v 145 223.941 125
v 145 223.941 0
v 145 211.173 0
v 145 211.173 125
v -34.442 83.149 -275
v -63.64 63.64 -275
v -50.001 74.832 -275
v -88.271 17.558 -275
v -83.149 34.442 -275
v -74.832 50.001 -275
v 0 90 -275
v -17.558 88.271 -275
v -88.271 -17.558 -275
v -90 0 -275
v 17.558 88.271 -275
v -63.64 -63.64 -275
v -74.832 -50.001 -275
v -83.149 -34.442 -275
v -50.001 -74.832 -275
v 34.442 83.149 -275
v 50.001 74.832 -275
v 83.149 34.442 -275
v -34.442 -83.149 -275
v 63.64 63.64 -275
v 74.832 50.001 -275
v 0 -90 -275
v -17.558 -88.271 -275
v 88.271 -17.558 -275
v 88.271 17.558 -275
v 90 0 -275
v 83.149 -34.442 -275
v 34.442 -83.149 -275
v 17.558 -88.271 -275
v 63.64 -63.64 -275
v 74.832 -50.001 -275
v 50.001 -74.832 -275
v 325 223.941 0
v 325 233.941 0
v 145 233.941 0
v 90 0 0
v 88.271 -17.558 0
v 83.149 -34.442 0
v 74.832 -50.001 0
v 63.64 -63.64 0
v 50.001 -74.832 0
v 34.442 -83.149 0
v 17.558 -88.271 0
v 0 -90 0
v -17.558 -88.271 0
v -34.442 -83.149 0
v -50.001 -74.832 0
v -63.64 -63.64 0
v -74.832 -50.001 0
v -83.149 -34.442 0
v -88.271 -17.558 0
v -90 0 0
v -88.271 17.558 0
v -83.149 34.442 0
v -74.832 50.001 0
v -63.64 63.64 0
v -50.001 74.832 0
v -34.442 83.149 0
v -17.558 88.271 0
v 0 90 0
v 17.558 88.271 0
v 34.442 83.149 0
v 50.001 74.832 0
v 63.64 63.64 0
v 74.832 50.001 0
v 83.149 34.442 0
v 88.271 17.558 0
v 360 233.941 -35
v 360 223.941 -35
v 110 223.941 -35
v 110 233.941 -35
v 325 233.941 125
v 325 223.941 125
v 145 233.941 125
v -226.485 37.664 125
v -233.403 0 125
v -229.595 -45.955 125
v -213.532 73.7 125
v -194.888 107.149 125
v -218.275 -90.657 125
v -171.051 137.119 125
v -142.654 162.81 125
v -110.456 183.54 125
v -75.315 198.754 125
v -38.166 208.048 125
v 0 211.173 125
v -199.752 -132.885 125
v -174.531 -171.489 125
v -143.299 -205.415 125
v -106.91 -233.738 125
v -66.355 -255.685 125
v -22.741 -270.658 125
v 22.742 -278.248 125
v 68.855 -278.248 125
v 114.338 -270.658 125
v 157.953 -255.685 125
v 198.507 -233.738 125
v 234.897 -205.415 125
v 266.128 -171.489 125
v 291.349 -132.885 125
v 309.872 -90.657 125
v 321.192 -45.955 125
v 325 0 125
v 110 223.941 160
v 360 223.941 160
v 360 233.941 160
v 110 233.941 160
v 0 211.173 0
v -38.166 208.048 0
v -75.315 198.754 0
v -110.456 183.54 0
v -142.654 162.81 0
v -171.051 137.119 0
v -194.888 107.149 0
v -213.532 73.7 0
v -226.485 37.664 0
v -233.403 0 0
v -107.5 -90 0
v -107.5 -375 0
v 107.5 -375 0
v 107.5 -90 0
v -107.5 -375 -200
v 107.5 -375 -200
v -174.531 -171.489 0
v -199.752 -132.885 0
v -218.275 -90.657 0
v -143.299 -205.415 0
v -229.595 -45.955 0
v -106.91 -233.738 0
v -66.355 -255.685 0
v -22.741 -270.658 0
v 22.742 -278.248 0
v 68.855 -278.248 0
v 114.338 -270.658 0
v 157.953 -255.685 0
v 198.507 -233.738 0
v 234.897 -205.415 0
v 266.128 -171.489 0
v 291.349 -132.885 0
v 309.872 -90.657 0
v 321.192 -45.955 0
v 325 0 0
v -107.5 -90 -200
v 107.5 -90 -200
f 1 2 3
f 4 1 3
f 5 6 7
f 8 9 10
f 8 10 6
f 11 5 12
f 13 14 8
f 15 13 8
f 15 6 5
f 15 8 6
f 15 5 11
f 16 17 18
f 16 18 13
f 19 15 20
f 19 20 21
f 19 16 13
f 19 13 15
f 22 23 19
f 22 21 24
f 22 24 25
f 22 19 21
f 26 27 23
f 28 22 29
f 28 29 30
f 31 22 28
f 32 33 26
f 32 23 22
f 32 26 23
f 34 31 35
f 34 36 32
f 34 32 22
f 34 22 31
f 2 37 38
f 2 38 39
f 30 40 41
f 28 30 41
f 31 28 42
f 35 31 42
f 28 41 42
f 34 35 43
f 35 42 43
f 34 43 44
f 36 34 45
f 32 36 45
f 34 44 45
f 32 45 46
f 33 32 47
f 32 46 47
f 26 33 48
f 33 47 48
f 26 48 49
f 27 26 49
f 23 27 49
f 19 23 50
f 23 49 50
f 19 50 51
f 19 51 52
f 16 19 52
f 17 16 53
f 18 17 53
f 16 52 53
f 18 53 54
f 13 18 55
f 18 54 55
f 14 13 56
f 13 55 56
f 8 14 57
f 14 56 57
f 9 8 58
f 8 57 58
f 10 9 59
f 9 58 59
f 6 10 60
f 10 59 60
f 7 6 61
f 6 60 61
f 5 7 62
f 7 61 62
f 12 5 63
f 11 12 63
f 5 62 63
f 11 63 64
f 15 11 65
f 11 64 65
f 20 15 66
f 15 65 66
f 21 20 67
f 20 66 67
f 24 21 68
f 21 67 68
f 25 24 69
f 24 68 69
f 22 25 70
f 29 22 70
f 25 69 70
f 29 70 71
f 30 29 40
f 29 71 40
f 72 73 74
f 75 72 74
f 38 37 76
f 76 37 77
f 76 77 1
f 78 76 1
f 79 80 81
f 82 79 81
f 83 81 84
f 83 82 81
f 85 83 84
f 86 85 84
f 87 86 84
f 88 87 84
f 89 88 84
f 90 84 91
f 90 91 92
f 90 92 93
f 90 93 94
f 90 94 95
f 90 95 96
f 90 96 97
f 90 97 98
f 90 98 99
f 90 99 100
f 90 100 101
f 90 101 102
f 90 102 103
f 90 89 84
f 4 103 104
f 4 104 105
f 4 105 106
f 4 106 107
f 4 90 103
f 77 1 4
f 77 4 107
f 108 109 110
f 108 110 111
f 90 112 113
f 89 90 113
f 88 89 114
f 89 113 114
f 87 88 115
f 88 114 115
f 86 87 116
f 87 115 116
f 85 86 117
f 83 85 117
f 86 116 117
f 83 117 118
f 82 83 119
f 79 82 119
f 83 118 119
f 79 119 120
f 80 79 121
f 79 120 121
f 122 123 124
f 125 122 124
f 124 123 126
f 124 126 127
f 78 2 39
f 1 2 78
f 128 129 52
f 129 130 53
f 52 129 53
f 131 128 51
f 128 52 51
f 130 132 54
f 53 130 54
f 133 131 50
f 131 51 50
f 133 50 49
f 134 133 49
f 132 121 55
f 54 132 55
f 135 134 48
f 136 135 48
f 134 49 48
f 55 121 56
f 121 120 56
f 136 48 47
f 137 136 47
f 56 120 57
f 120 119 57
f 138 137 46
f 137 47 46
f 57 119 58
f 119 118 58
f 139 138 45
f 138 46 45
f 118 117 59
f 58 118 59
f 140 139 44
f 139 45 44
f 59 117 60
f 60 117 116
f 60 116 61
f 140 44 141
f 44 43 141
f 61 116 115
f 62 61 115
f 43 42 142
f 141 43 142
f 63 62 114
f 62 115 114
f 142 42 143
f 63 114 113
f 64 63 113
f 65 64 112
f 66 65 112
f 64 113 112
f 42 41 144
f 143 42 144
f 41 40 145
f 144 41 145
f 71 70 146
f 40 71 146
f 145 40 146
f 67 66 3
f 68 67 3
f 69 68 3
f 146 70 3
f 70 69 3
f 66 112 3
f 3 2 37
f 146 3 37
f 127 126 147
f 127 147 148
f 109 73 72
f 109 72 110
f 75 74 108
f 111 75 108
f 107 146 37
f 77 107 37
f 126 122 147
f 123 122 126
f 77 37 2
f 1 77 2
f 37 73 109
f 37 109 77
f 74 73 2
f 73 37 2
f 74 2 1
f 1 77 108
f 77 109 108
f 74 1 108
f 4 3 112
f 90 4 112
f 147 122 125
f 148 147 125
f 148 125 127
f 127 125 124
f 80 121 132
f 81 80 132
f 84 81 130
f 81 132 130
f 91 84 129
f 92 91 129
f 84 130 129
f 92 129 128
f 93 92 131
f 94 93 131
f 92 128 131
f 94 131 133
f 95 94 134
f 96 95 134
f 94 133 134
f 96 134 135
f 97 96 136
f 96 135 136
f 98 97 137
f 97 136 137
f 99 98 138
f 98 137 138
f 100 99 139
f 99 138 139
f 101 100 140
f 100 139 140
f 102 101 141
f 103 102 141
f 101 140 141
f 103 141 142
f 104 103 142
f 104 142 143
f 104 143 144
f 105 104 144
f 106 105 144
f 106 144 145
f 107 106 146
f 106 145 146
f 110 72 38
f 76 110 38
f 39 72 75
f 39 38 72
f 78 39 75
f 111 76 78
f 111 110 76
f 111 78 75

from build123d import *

# Parameters (mm, degrees)
F0_R     = 192.4855097927
F0_R_2   = 133.4691970043
F0_R_3   = 78.4792359607
F0_R_4   = 44.9880642018
F1_DEPTH = 125
F2_W     = 250
F2_H     = 195
F2_W_2   = 180
F2_H_2   = 125
F3_DEPTH = 10
F4_R     = 90
F5_DEPTH = 275
F6_W     = 215
F6_H     = 285
F7_DEPTH = 200


with BuildPart() as f1:
    # F0 (on Top) → F1 (new body)
    with BuildSketch(Plane.XY):
        with BuildLine():
            ThreePointArc((-233.4027856588, 0), (45.7986071706, -279.2013928294), (325, 0))
            Line((325, 0), (325, 223.9410325965))
            Line((325, 223.9410325965), (145, 223.9410325965))
            Line((145, 223.9410325965), (145, 211.1732696451))
            Line((145, 211.1732696451), (0, 211.1732696451))
            ThreePointArc((0, 211.1732696451), (-157.3777383923, 150.5448455883), (-233.4027856588, 0))
        make_face()
        Circle(F0_R, mode=Mode.SUBTRACT)
        Circle(F0_R)
        Circle(F0_R_2, mode=Mode.SUBTRACT)
        Circle(F0_R_2)
        Circle(F0_R_3, mode=Mode.SUBTRACT)
        Circle(F0_R_3)
        Circle(F0_R_4, mode=Mode.SUBTRACT)
        Circle(F0_R_4)
    extrude(amount=F1_DEPTH)

    # F4 (on face) → F5 (join)
    with BuildSketch(Plane(origin=(0, 0, 0), x_dir=(1, 0, 0), z_dir=(0, 0, -1))):
        Circle(F4_R)
    extrude(amount=F5_DEPTH)


with BuildPart() as f3:
    # F2 (on face) → F3 (new body)
    with BuildSketch(Plane(origin=(0, 223.9410325965, 0), x_dir=(-1, 0, 0), z_dir=(0, 1, 0))):
        with Locations((-235, 62.5)):
            Rectangle(F2_W, F2_H)
        with Locations((-235, 62.5)):
            Rectangle(F2_W_2, F2_H_2, mode=Mode.SUBTRACT)
    extrude(amount=F3_DEPTH)


with BuildPart() as f7:
    # F6 (on face) → F7 (new body)
    with BuildSketch(Plane(origin=(0, 0, 0), x_dir=(1, 0, 0), z_dir=(0, 0, -1))):
        with Locations((0, 232.5)):
            Rectangle(F6_W, F6_H)
    extrude(amount=F7_DEPTH)


solid = Compound([f1.part, f3.part, f7.part])
